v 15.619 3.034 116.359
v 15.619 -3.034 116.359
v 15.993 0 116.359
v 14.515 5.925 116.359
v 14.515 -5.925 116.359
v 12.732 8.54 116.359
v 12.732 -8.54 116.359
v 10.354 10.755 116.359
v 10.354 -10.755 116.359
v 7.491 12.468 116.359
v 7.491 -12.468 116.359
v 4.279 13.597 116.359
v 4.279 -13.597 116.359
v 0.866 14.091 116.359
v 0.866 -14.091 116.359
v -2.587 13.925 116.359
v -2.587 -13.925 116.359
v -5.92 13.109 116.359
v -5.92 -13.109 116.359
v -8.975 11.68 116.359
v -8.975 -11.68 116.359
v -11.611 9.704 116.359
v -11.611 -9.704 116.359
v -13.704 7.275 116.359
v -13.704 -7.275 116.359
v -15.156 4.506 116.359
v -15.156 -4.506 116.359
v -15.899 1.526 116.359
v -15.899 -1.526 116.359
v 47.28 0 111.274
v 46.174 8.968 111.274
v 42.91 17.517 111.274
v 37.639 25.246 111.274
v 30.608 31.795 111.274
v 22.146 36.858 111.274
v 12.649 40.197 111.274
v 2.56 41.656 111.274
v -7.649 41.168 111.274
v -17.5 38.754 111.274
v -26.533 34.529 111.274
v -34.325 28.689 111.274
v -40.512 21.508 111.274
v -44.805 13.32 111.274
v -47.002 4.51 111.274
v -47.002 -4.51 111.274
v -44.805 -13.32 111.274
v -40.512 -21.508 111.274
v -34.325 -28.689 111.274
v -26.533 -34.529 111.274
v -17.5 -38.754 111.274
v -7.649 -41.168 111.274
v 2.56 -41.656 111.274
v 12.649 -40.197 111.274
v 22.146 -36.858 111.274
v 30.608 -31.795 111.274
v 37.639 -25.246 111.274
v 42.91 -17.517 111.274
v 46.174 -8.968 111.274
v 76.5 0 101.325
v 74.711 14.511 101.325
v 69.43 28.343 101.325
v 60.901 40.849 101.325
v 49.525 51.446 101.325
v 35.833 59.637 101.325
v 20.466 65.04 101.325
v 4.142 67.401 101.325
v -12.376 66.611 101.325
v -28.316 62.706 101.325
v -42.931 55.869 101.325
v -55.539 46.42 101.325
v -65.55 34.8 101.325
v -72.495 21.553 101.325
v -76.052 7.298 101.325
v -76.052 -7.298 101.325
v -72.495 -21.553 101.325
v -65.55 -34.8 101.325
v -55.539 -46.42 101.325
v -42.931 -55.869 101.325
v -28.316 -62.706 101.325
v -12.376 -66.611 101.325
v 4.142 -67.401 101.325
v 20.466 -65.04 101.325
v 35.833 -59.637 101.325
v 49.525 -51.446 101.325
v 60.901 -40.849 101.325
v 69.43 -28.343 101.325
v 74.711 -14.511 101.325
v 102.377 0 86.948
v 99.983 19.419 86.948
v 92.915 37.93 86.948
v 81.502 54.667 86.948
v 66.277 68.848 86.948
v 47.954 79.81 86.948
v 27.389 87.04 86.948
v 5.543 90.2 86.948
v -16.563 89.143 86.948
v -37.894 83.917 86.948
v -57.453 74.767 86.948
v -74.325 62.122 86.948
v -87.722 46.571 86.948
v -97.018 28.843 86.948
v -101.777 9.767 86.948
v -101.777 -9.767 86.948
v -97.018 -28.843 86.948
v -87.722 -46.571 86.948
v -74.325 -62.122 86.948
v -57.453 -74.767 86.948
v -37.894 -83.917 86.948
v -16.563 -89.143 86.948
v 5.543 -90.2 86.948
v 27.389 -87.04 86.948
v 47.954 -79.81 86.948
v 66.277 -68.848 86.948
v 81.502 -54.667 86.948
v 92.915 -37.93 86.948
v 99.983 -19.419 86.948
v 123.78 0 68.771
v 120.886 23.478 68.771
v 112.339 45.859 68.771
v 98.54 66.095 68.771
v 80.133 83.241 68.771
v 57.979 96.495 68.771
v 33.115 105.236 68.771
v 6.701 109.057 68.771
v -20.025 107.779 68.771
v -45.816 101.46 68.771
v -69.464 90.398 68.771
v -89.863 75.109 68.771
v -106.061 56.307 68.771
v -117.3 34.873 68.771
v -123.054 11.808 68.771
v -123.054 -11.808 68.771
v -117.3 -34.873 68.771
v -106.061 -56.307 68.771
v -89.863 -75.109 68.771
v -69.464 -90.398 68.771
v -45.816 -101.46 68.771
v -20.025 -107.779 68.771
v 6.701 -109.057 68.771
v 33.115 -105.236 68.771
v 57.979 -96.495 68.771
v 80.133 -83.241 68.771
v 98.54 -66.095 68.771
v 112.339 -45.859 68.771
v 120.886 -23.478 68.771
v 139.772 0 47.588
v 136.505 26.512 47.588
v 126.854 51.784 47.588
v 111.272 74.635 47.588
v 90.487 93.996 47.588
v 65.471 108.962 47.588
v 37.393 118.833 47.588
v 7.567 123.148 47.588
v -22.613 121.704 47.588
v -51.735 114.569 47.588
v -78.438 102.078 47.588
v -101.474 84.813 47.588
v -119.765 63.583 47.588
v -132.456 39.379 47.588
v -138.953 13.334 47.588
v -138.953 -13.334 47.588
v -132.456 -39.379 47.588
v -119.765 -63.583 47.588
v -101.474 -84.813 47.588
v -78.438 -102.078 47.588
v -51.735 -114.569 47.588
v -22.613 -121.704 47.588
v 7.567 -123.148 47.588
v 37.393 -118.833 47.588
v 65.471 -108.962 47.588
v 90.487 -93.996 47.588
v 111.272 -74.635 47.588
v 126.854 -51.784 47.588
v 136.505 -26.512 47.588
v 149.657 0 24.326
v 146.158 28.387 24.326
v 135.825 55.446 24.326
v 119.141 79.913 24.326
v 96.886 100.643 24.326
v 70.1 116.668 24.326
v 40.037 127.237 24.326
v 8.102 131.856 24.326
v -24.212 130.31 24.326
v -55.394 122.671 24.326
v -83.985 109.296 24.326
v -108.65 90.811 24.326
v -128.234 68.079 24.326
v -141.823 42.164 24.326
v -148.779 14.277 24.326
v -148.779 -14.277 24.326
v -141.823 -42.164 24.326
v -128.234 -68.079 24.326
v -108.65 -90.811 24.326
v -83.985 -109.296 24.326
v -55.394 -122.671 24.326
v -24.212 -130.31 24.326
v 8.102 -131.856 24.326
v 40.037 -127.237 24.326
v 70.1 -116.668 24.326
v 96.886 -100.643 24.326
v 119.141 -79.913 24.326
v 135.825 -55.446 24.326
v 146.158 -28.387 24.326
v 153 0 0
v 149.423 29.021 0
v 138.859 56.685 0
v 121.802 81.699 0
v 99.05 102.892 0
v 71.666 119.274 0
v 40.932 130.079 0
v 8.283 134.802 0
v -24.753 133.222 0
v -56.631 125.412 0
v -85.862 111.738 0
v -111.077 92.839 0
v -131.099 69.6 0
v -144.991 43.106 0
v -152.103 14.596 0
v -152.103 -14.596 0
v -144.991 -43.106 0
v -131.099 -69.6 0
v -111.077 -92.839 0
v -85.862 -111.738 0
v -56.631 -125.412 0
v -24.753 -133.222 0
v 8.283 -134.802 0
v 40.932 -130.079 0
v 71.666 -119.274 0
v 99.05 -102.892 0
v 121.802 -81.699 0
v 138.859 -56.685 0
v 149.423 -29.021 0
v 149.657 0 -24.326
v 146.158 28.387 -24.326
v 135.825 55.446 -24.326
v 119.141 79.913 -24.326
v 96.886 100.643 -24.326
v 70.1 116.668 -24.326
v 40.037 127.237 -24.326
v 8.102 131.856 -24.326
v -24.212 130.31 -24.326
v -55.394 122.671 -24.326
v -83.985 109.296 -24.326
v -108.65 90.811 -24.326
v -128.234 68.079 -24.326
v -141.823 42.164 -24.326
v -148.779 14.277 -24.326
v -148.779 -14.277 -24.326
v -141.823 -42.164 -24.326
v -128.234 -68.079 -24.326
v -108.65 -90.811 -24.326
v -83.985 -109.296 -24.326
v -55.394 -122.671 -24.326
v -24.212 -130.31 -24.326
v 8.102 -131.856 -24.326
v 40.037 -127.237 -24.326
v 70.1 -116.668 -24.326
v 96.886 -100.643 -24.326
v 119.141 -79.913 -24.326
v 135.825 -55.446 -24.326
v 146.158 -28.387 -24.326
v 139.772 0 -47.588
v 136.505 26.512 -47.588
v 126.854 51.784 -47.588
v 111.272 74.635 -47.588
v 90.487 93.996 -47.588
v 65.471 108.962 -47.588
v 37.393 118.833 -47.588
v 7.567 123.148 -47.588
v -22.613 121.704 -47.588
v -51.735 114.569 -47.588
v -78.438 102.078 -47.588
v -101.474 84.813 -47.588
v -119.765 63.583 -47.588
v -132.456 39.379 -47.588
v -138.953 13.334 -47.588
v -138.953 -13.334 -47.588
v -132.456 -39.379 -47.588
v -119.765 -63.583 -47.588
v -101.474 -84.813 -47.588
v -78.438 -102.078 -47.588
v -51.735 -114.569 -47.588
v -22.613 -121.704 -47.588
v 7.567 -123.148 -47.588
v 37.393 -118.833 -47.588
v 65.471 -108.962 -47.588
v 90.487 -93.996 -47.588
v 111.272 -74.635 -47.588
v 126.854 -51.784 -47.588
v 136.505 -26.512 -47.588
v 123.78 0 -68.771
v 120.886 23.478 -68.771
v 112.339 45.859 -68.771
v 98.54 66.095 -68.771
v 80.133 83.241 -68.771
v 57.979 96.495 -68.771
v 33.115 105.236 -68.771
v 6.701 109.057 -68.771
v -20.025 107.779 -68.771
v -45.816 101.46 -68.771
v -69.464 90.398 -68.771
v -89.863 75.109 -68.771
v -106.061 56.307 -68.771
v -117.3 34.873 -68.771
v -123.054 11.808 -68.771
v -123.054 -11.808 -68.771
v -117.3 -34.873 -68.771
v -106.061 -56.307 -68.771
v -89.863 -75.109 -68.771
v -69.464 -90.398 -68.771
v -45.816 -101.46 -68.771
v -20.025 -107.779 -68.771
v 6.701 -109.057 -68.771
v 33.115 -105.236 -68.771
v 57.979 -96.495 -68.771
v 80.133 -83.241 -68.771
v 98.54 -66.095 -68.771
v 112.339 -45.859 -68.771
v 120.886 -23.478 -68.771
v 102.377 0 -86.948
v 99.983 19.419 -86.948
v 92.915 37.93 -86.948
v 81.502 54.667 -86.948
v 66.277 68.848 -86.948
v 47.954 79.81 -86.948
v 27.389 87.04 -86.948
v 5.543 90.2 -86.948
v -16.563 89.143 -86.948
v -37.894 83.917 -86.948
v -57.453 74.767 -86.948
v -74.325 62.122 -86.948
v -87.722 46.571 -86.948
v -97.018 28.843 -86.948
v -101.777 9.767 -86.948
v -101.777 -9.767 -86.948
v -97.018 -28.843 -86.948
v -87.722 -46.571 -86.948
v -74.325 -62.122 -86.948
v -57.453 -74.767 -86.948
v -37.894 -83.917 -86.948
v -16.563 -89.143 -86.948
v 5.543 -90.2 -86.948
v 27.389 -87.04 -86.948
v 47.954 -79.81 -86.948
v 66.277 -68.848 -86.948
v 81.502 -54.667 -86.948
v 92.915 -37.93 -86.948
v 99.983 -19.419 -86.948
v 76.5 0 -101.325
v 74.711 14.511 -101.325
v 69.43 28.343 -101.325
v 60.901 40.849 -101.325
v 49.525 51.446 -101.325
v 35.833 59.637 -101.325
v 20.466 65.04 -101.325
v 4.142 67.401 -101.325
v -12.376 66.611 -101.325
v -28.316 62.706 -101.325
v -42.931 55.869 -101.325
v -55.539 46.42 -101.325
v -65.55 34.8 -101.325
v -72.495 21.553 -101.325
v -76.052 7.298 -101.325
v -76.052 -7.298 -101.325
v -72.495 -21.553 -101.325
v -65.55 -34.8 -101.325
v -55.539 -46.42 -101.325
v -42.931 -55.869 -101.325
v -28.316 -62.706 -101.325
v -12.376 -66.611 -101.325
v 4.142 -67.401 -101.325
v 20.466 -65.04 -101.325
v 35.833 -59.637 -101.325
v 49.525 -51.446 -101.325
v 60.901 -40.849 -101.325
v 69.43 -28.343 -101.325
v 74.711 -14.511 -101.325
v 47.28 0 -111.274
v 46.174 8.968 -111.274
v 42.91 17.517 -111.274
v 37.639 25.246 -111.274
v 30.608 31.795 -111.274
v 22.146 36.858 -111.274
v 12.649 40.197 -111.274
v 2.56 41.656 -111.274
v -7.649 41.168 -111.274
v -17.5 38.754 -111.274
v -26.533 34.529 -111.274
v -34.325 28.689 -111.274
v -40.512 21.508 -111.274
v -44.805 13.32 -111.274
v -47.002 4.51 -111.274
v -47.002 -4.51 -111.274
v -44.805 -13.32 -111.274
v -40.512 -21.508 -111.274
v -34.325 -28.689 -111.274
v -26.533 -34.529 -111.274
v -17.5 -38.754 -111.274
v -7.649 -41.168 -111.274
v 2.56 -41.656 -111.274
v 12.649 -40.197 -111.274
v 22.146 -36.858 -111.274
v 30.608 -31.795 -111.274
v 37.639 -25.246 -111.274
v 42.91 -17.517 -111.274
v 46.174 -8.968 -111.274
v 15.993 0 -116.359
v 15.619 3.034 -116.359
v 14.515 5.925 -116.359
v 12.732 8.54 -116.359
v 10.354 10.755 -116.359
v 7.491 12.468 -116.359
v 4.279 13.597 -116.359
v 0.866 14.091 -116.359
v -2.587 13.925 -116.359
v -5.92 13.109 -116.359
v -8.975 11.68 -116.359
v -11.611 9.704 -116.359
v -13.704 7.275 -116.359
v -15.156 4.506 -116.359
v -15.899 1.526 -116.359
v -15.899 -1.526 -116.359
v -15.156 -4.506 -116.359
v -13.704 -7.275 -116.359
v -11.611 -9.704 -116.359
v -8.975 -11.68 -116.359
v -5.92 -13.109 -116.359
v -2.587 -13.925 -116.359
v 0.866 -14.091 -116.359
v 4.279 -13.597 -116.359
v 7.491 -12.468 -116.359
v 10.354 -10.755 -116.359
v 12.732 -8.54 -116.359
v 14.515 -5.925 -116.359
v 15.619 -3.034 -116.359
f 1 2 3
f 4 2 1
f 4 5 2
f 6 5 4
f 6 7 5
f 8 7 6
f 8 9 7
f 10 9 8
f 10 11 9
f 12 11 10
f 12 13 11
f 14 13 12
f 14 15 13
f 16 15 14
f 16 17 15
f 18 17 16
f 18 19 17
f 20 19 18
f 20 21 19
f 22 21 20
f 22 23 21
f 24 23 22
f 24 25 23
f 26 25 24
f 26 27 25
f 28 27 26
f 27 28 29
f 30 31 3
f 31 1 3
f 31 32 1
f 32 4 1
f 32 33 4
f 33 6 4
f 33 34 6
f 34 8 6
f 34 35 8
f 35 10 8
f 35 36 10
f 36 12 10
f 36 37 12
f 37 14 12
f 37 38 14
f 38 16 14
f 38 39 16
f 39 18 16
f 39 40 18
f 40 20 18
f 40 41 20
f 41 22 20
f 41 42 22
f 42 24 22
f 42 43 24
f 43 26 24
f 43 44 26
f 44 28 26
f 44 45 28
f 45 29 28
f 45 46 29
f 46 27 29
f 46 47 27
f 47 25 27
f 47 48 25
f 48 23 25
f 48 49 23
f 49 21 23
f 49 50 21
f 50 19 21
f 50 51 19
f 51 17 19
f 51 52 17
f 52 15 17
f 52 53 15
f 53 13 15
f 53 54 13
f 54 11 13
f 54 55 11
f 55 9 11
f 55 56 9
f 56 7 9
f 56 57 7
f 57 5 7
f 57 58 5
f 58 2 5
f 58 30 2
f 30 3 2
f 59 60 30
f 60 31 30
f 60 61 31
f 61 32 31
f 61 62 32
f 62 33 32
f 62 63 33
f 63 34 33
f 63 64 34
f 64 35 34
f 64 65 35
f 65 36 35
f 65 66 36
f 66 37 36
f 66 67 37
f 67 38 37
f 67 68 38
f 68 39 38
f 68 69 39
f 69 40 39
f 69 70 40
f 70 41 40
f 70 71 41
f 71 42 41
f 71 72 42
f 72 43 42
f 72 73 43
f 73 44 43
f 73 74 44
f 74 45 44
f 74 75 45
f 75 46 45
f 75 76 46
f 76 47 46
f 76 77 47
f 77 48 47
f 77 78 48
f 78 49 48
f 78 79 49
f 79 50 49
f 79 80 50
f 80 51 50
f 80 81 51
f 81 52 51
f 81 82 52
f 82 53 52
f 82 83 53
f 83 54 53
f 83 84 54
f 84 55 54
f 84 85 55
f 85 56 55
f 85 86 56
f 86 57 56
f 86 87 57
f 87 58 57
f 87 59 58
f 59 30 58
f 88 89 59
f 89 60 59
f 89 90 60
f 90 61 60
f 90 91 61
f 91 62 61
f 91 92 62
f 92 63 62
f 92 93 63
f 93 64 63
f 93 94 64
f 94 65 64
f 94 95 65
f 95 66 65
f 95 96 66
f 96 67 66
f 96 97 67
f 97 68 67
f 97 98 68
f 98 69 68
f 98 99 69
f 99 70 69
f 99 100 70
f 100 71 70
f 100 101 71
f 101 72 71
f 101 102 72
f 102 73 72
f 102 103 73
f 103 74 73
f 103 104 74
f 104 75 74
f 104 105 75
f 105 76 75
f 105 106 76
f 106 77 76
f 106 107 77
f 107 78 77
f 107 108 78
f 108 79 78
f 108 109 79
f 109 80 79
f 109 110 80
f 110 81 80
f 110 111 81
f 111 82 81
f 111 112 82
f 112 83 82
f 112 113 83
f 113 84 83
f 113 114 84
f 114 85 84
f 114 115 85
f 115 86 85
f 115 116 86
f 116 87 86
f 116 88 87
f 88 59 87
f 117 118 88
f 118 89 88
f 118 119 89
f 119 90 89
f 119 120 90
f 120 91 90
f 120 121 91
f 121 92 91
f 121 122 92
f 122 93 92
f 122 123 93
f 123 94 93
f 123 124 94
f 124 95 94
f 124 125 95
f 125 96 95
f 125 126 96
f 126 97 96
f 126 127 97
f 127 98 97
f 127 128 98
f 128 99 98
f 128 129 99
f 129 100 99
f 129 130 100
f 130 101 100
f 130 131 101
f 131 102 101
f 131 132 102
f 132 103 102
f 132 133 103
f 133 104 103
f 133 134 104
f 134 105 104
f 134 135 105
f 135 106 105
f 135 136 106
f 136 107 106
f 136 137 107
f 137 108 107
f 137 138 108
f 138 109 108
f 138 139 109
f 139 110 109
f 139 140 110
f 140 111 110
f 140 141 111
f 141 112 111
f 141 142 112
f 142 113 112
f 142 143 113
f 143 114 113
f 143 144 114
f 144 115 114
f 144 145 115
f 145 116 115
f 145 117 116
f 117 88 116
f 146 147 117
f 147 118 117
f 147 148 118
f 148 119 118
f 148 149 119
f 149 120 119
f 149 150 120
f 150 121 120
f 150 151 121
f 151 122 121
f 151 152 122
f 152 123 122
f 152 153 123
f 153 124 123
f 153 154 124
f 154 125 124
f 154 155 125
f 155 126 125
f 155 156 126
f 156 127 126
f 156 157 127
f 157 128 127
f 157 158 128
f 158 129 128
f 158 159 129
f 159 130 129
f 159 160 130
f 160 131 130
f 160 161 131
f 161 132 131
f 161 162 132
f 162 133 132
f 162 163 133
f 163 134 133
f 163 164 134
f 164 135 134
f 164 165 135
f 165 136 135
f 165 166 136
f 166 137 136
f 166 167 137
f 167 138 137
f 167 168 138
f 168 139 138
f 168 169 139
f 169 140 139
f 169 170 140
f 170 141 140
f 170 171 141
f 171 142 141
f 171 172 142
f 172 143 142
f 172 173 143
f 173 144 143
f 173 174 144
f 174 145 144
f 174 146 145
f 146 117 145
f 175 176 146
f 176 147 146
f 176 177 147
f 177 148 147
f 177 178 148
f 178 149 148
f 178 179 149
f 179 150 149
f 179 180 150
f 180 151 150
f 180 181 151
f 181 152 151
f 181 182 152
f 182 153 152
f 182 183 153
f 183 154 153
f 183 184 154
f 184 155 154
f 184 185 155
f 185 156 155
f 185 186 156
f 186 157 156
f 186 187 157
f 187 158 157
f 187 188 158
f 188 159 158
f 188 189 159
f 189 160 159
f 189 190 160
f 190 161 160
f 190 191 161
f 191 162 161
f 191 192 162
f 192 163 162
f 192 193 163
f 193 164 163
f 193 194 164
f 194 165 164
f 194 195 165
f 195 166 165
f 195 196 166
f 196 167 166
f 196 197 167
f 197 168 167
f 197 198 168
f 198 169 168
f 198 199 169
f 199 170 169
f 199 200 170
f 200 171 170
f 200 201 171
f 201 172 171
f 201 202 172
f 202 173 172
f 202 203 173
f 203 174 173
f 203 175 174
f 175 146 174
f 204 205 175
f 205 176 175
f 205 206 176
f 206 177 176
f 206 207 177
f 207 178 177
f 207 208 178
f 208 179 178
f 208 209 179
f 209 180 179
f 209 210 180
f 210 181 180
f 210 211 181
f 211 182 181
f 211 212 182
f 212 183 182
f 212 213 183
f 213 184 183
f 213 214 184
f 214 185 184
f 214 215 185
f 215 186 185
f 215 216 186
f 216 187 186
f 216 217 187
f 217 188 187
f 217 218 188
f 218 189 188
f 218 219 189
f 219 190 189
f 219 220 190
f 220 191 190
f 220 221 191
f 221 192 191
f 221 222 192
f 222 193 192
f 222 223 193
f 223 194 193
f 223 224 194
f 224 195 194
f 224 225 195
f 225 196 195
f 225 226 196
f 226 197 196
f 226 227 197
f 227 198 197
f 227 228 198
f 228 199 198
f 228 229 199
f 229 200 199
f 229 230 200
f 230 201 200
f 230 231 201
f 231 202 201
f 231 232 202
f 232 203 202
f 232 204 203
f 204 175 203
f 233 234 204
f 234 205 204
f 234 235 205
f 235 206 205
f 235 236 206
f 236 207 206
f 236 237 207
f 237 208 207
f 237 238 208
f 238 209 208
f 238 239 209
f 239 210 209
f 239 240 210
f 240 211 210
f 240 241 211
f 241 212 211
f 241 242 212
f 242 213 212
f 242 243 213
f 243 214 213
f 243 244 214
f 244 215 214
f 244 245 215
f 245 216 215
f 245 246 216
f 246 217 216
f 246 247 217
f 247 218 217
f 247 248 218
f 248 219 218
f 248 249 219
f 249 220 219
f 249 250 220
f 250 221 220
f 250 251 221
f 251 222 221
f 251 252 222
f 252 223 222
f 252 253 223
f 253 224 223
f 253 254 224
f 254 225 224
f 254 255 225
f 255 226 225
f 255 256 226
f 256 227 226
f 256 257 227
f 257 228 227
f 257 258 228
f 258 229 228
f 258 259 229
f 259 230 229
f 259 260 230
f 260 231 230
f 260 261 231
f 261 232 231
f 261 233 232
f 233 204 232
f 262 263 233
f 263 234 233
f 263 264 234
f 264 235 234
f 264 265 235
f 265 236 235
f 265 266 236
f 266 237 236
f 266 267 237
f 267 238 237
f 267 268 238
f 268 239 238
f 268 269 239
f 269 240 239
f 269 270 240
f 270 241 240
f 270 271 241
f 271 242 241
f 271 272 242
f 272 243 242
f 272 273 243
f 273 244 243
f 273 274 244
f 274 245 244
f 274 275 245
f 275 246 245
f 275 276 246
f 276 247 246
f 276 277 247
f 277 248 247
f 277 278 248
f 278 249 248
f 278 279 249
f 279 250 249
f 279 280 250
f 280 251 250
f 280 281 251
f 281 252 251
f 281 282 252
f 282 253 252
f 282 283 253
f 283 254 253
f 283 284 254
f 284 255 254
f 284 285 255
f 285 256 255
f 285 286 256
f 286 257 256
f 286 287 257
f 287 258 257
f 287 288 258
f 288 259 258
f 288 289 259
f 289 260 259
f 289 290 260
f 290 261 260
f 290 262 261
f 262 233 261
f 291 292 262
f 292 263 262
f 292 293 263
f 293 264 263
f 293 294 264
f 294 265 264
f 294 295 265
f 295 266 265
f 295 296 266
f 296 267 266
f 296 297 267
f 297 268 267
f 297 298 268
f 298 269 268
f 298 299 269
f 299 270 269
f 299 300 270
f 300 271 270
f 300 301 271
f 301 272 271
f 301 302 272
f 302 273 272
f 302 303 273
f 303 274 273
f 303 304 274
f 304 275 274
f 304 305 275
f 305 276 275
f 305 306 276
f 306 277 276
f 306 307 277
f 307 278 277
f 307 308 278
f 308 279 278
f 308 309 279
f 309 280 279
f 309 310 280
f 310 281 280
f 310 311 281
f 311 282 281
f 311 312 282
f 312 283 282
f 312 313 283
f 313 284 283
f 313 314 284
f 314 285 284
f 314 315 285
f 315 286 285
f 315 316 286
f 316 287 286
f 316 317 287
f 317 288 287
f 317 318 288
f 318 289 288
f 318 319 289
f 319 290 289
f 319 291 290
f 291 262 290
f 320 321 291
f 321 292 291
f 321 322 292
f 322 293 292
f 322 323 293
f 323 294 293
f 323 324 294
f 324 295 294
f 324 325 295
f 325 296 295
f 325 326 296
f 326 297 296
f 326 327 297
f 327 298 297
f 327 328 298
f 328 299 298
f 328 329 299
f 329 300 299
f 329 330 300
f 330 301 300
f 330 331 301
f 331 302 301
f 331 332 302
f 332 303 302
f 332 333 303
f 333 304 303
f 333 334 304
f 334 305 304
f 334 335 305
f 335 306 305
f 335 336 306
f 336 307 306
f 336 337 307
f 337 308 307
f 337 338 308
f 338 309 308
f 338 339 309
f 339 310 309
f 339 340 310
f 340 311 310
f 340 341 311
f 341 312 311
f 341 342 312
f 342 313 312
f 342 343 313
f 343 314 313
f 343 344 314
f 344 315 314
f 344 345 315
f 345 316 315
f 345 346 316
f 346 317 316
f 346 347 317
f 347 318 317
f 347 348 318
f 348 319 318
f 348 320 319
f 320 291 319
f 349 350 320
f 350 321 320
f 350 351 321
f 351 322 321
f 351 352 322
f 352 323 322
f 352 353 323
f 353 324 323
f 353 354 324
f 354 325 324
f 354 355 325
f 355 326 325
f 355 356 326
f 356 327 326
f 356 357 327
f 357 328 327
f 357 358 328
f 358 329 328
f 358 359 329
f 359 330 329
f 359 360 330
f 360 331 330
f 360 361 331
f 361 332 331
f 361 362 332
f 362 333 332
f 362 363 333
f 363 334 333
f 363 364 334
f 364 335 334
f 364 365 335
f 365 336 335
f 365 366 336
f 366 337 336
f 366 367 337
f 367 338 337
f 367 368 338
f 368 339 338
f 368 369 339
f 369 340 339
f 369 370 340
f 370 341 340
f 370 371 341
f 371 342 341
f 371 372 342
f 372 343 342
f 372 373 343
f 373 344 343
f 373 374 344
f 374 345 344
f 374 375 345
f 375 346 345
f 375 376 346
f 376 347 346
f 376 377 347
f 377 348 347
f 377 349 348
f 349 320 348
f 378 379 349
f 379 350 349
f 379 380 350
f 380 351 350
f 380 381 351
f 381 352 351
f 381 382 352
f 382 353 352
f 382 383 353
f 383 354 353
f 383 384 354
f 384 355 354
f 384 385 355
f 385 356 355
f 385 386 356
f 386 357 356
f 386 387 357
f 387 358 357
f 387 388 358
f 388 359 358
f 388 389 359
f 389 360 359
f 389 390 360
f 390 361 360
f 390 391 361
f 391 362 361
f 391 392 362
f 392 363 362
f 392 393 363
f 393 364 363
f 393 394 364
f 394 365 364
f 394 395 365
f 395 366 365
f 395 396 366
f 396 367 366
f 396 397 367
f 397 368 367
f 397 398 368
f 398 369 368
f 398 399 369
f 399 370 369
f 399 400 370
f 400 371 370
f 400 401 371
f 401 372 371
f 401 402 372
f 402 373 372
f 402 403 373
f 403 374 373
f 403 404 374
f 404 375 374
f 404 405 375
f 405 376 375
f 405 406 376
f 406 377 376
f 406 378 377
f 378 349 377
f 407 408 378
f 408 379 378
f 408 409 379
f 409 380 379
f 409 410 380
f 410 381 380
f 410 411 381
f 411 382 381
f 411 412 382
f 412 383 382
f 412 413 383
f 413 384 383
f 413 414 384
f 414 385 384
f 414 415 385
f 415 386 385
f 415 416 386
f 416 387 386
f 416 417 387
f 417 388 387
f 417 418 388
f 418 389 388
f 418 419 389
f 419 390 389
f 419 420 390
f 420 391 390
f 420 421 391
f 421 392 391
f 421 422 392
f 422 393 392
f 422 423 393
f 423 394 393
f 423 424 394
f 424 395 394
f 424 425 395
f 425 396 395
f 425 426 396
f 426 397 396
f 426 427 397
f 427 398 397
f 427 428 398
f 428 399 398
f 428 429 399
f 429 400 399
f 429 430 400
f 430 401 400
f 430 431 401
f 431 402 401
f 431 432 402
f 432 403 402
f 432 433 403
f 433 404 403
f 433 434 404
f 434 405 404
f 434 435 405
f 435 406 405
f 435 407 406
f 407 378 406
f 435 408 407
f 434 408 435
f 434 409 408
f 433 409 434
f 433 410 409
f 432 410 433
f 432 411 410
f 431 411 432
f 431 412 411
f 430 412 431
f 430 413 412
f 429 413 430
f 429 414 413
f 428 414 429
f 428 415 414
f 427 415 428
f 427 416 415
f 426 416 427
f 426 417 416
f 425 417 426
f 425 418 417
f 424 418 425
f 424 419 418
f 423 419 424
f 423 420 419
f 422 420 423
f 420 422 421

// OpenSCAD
// Generated by SolidPython 1.0.1 on 2020-07-29 00:46:53


scale(v = [17, 15, 13]) {
	sphere(r = 9);
}
/***********************************************
*********      SolidPython code:      **********
************************************************
 
# import packages: SolidPython
from solid import *
from solid.utils import *
from itertools import chain, combinations, permutations


class Resize:

    def __init__(self, scad_file):
        self.scad_file = scad_file
        #self.scad_file = import_scad(scad_file)
        # cone/cylinder param:
        self.r1 = 0
        self.r2 = 0
        self.h = 0
        # rectangular prism param:
        self.w = 0
        self.l = 0
        # ellipse param:
        self.r = 0

    # import OpenScad code (file name corresponds to shape)


    # classify shape + parameters
    def assign(self, param1, param2, param3):
        if self.scad_file == 'cone.scad':
            self.r1 = param1
            self.r2 = param2
            self.h = param3
        elif self.scad_file == 'cylinder.scad':
            self.r1 = param1
            self.r2 = param2
            self.h = param3
        elif self.scad_file == 'rectangularPrism.scad':
            self.h = param1
            self.l = param2
            self.w = param3
        else:
            self.r = param1
            self.h = param2

    # resize parameters
    def iterate(self):
        x = range(3, 20, 2)
        i = 1
        if self.scad_file == 'cone.scad':
            tempList = list(permutations(x, 2))
            for temp in tempList:
                param1 = temp[0]
                param2 = temp[1]
                filepath = 'produced_scad_files/' + 'cone' + str(param1) + '_' + str(param2) + '_' + '.scad'
                scad_render_to_file(cylinder(h=param1, r1=param2, r2=0), filepath)

        elif self.scad_file == 'cylinder.scad':
            tempList = list(permutations(x, 3))
            for temp in tempList:
                param1 = temp[0]
                param2 = temp[1]
                filepath = 'produced_scad_files/' + 'cylinder' + str(param1) + '_' + str(param2) + '_' + '.scad'
                scad_render_to_file(cylinder(h=param1, r1=param2, r2=param2), filepath)

        elif self.scad_file == 'rectangularPrism.scad':
            tempList = list(permutations(x, 3))
            for temp in tempList:
                param1 = temp[0]
                param2 = temp[1]
                param3 = temp[2]
                filepath = 'produced_scad_files/' + 'rectangularPrism' + str(param1) + '_' + str(param2) + '_' + str(
                    param3) + '.scad'
                scad_render_to_file(cube(size=(param1, param2, param3)), filepath)

        elif self.scad_file == 'ellipse.scad':
            tempList = list(permutations(x, 4))
            for temp in tempList:
                param1 = temp[0]
                param2 = temp[1]
                param3 = temp[2]
                param4 = temp[3]
                filepath = 'produced_scad_files/' + 'ellipse' + str(param1) + '_' + str(param2) + '_' + str(param3) + '_' + str(param4) + '.scad'
                scad_render_to_file(scale([param1, param2, param3])(sphere(r=param4)), filepath)

    def render_to_scadfile(self):
        scad_render_to_file(scad, 'example.scad') 
 
************************************************/
